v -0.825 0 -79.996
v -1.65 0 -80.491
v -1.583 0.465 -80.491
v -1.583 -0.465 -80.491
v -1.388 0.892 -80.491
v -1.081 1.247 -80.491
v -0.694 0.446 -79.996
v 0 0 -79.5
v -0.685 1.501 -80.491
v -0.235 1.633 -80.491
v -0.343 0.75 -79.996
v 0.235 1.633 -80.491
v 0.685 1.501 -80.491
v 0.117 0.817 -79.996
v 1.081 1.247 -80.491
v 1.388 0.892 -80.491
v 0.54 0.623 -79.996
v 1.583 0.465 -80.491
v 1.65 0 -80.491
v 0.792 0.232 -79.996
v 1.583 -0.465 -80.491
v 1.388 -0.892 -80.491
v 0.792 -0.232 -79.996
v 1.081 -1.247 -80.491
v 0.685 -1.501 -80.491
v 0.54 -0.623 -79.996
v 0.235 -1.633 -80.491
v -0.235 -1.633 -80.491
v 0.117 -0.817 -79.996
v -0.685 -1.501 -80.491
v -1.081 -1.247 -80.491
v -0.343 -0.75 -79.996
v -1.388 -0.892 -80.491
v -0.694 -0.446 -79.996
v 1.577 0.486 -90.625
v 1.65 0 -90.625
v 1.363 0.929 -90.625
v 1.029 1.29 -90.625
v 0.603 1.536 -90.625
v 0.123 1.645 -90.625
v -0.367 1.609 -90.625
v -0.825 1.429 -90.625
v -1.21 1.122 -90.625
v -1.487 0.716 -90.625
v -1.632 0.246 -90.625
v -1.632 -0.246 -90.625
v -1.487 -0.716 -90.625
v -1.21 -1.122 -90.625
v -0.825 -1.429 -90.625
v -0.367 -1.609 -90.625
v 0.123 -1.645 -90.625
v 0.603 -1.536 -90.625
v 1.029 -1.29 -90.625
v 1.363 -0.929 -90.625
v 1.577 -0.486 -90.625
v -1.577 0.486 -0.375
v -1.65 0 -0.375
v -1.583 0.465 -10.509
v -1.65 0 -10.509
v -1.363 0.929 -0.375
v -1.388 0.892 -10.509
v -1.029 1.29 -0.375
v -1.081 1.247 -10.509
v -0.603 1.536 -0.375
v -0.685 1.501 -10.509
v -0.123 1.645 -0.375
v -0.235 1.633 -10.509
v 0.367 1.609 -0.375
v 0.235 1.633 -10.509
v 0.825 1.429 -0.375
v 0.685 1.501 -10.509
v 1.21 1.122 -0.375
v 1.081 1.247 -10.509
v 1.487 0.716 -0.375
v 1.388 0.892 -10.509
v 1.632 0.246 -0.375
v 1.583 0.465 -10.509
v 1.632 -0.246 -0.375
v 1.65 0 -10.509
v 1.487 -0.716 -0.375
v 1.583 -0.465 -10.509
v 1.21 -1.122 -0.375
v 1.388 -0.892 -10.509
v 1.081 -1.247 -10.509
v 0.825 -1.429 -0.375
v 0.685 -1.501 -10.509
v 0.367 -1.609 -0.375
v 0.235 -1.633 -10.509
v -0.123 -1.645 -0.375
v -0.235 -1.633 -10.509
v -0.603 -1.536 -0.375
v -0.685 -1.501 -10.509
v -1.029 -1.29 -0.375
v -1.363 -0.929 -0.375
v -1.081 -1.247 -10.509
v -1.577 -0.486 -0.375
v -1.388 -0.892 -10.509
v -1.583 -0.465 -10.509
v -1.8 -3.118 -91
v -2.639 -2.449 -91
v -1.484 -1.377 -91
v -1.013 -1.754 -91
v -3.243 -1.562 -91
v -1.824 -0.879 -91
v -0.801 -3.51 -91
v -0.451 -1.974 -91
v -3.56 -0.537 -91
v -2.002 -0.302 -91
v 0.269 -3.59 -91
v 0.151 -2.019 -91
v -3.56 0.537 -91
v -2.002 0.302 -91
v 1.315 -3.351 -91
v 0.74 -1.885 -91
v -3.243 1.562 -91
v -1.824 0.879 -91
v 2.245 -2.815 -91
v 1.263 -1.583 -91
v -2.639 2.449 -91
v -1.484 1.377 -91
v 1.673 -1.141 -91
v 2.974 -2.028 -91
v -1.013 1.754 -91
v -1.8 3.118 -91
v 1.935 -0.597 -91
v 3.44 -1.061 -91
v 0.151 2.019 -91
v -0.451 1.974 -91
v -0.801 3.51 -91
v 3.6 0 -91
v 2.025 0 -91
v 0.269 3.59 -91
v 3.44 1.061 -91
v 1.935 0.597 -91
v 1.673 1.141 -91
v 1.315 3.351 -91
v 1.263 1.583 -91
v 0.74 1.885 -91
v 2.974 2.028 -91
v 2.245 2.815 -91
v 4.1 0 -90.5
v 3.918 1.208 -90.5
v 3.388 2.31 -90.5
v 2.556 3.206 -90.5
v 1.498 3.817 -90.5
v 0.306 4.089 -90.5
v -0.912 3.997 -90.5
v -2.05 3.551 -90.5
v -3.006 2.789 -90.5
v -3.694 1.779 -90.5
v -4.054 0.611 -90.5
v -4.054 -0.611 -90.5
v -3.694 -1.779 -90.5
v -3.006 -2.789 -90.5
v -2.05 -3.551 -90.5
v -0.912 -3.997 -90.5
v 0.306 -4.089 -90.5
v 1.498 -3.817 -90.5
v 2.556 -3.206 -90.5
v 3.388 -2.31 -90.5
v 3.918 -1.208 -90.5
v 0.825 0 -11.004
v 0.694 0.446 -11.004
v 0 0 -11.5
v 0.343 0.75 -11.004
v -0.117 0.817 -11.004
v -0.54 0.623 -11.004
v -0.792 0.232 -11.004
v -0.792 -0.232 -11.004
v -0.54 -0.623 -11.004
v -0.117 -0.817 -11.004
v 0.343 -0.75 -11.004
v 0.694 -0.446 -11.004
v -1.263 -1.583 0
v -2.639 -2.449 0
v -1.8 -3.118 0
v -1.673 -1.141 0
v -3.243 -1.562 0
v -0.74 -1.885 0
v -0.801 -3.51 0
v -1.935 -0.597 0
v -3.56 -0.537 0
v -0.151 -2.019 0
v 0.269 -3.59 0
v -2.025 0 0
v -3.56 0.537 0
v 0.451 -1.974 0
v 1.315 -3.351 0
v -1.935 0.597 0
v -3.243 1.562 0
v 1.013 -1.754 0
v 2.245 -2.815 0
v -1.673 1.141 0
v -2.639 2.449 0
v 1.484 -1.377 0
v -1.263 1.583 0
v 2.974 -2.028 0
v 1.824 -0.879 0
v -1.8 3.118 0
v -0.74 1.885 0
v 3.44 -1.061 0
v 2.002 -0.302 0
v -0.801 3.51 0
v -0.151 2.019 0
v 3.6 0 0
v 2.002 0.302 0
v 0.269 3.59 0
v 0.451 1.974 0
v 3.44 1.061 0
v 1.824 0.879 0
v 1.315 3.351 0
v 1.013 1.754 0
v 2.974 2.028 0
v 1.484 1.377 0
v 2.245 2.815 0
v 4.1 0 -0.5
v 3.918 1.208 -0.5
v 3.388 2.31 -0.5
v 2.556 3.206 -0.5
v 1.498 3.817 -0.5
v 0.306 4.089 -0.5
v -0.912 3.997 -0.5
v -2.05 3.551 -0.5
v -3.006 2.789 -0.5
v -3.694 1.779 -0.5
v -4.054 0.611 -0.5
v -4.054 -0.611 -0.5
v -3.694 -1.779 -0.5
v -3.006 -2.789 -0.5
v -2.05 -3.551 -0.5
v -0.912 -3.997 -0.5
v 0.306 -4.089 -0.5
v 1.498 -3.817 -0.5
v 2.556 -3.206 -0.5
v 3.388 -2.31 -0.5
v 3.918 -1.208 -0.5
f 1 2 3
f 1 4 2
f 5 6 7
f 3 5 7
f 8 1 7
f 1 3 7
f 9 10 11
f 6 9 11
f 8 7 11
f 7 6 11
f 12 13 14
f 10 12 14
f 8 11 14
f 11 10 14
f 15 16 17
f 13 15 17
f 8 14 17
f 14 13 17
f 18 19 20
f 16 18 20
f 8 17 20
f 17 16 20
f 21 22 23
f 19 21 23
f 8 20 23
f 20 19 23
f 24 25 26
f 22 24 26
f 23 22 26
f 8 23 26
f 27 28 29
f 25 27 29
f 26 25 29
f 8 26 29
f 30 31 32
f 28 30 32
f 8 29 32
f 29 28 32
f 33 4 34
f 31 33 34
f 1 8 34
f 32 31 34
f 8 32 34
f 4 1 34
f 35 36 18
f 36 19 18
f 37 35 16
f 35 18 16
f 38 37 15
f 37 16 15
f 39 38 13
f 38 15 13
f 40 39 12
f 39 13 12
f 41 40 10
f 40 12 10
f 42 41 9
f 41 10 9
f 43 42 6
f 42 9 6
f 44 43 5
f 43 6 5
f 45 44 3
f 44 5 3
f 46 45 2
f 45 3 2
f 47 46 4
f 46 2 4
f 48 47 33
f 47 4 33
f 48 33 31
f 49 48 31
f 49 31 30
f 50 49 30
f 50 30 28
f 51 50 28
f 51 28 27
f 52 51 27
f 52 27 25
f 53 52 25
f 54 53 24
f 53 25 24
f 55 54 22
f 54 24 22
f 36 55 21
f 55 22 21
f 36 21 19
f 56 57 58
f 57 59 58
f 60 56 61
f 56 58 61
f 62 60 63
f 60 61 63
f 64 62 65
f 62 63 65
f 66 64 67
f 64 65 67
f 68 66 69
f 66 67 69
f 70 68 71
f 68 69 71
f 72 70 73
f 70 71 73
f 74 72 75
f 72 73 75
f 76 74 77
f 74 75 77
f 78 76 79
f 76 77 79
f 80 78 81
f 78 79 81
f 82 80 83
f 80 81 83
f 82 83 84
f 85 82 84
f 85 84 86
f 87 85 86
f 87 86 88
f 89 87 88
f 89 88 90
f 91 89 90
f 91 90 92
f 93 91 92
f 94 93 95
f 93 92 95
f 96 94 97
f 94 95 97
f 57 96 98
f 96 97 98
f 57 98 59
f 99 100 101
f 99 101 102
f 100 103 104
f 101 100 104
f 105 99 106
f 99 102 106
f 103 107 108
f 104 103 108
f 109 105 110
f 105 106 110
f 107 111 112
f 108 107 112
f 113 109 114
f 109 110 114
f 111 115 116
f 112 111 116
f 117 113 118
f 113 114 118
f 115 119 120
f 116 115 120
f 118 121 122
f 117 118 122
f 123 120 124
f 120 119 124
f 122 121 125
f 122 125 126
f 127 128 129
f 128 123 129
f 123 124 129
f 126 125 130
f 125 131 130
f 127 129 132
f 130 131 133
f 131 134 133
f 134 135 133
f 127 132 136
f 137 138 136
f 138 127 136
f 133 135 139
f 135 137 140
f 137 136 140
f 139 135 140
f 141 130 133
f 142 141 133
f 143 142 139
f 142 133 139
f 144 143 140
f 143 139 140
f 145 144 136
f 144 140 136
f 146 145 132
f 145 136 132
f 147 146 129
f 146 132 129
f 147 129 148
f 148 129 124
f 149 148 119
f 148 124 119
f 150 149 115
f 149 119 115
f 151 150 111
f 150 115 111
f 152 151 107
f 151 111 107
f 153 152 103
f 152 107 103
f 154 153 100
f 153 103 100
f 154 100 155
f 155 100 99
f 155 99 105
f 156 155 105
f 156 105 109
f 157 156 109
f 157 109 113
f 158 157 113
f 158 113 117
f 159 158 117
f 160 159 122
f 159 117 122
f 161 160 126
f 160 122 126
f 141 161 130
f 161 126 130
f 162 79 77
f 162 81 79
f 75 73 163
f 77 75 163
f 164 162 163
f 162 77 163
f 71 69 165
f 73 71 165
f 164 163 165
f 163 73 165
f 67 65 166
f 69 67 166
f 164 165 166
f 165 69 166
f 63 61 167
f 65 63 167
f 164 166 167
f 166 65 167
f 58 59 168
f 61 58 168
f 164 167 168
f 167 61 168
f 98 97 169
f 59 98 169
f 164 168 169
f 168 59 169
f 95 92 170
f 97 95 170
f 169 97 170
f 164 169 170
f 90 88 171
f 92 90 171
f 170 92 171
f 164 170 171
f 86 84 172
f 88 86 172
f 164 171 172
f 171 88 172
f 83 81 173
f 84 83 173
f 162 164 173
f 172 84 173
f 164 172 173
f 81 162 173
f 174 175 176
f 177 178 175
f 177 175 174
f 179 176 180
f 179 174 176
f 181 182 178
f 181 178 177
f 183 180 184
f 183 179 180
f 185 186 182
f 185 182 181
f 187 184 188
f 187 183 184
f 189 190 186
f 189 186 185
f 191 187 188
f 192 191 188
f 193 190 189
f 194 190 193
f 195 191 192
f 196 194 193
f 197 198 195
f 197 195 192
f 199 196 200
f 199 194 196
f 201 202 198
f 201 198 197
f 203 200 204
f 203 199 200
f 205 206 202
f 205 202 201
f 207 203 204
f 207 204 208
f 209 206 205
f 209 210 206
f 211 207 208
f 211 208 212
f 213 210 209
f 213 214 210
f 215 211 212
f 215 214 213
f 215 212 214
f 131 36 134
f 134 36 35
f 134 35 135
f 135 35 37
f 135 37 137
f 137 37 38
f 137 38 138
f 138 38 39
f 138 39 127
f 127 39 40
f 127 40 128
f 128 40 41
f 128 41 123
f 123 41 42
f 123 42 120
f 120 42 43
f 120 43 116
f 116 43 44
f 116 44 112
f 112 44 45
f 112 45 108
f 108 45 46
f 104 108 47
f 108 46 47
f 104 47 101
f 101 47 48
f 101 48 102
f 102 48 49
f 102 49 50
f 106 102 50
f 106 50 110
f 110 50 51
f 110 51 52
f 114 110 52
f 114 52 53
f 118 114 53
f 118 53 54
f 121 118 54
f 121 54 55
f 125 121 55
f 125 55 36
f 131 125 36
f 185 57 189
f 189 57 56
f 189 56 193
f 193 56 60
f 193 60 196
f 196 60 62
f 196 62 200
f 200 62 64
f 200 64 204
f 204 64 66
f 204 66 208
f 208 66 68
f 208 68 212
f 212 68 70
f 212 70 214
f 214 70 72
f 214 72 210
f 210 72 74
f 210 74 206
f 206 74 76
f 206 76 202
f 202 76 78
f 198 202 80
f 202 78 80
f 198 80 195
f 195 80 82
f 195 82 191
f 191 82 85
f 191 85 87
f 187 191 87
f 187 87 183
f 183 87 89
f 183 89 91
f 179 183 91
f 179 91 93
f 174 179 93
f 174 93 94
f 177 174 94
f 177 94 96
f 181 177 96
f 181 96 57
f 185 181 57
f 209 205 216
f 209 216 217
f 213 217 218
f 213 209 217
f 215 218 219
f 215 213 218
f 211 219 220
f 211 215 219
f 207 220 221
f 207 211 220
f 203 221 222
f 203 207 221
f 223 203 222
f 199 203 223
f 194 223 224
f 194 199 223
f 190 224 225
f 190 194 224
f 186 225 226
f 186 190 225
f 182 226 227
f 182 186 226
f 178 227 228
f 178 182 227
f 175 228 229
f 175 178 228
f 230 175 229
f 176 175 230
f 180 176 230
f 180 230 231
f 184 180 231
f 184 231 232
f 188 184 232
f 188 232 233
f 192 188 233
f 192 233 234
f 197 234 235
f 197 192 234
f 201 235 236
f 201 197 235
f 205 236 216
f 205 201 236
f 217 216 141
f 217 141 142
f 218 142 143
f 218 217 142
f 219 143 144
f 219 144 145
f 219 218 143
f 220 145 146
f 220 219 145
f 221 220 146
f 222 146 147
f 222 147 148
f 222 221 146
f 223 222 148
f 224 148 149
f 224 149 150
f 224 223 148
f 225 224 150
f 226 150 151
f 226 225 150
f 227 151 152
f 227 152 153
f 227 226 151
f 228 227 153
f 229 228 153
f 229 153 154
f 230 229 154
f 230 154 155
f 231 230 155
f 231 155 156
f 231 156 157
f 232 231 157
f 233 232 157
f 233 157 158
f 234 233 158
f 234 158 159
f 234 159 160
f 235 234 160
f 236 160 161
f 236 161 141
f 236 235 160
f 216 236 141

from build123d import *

# Parameters (mm, degrees)
SKETCH1_R                  = 4.1
BLANK_DEPTH                = 91
FURO_1_M4X11_5_D           = 3.3
FURO_1_M4X11_5_DEPTH       = 10.508579979
FURO_1_M4X11_5_CSINK_D     = 4.05
FURO_1_M4X11_5_CSINK_ANGLE = 90
FURO_1_M4X11_5_TIP         = 0.991420021
FURO_2_M4X11_5_D           = 3.3
FURO_2_M4X11_5_DEPTH       = 10.508579979
FURO_2_M4X11_5_CSINK_D     = 4.05
FURO_2_M4X11_5_CSINK_ANGLE = 90
FURO_2_M4X11_5_TIP         = 0.991420021
CHANFROS_SIZE              = 0.5


with BuildPart() as part:
    # Sketch1 → Blank (new body)
    with BuildSketch(Plane.XY):
        Circle(SKETCH1_R)
    extrude(amount=-BLANK_DEPTH)

    # Furo 1 -  M4x11.5
    with Locations(Plane.XY):
        with Locations((0, 0)):
            CounterSinkHole(FURO_1_M4X11_5_D / 2, FURO_1_M4X11_5_CSINK_D / 2, depth=FURO_1_M4X11_5_DEPTH, counter_sink_angle=FURO_1_M4X11_5_CSINK_ANGLE)
            with Locations((0, 0, -(FURO_1_M4X11_5_DEPTH + FURO_1_M4X11_5_TIP / 2))):  # 118° drill point
                Cone(0, FURO_1_M4X11_5_D / 2, FURO_1_M4X11_5_TIP, mode=Mode.SUBTRACT)

    # Furo 2 -  M4x11.5
    with Locations(Plane(origin=(0, 0, -91), x_dir=(-1, 0, 0), z_dir=(0, 0, -1))):
        with Locations((0, 0)):
            CounterSinkHole(FURO_2_M4X11_5_D / 2, FURO_2_M4X11_5_CSINK_D / 2, depth=FURO_2_M4X11_5_DEPTH, counter_sink_angle=FURO_2_M4X11_5_CSINK_ANGLE)
            with Locations((0, 0, -(FURO_2_M4X11_5_DEPTH + FURO_2_M4X11_5_TIP / 2))):  # 118° drill point
                Cone(0, FURO_2_M4X11_5_D / 2, FURO_2_M4X11_5_TIP, mode=Mode.SUBTRACT)

    # Chanfros
    chanfros_edges = [part.edges().sort_by_distance(p)[0] for p in [
        (-4.1, 0, 0),
        (-4.1, 0, -91),
    ]]
    chamfer(chanfros_edges, length=CHANFROS_SIZE)


solid = part.part
